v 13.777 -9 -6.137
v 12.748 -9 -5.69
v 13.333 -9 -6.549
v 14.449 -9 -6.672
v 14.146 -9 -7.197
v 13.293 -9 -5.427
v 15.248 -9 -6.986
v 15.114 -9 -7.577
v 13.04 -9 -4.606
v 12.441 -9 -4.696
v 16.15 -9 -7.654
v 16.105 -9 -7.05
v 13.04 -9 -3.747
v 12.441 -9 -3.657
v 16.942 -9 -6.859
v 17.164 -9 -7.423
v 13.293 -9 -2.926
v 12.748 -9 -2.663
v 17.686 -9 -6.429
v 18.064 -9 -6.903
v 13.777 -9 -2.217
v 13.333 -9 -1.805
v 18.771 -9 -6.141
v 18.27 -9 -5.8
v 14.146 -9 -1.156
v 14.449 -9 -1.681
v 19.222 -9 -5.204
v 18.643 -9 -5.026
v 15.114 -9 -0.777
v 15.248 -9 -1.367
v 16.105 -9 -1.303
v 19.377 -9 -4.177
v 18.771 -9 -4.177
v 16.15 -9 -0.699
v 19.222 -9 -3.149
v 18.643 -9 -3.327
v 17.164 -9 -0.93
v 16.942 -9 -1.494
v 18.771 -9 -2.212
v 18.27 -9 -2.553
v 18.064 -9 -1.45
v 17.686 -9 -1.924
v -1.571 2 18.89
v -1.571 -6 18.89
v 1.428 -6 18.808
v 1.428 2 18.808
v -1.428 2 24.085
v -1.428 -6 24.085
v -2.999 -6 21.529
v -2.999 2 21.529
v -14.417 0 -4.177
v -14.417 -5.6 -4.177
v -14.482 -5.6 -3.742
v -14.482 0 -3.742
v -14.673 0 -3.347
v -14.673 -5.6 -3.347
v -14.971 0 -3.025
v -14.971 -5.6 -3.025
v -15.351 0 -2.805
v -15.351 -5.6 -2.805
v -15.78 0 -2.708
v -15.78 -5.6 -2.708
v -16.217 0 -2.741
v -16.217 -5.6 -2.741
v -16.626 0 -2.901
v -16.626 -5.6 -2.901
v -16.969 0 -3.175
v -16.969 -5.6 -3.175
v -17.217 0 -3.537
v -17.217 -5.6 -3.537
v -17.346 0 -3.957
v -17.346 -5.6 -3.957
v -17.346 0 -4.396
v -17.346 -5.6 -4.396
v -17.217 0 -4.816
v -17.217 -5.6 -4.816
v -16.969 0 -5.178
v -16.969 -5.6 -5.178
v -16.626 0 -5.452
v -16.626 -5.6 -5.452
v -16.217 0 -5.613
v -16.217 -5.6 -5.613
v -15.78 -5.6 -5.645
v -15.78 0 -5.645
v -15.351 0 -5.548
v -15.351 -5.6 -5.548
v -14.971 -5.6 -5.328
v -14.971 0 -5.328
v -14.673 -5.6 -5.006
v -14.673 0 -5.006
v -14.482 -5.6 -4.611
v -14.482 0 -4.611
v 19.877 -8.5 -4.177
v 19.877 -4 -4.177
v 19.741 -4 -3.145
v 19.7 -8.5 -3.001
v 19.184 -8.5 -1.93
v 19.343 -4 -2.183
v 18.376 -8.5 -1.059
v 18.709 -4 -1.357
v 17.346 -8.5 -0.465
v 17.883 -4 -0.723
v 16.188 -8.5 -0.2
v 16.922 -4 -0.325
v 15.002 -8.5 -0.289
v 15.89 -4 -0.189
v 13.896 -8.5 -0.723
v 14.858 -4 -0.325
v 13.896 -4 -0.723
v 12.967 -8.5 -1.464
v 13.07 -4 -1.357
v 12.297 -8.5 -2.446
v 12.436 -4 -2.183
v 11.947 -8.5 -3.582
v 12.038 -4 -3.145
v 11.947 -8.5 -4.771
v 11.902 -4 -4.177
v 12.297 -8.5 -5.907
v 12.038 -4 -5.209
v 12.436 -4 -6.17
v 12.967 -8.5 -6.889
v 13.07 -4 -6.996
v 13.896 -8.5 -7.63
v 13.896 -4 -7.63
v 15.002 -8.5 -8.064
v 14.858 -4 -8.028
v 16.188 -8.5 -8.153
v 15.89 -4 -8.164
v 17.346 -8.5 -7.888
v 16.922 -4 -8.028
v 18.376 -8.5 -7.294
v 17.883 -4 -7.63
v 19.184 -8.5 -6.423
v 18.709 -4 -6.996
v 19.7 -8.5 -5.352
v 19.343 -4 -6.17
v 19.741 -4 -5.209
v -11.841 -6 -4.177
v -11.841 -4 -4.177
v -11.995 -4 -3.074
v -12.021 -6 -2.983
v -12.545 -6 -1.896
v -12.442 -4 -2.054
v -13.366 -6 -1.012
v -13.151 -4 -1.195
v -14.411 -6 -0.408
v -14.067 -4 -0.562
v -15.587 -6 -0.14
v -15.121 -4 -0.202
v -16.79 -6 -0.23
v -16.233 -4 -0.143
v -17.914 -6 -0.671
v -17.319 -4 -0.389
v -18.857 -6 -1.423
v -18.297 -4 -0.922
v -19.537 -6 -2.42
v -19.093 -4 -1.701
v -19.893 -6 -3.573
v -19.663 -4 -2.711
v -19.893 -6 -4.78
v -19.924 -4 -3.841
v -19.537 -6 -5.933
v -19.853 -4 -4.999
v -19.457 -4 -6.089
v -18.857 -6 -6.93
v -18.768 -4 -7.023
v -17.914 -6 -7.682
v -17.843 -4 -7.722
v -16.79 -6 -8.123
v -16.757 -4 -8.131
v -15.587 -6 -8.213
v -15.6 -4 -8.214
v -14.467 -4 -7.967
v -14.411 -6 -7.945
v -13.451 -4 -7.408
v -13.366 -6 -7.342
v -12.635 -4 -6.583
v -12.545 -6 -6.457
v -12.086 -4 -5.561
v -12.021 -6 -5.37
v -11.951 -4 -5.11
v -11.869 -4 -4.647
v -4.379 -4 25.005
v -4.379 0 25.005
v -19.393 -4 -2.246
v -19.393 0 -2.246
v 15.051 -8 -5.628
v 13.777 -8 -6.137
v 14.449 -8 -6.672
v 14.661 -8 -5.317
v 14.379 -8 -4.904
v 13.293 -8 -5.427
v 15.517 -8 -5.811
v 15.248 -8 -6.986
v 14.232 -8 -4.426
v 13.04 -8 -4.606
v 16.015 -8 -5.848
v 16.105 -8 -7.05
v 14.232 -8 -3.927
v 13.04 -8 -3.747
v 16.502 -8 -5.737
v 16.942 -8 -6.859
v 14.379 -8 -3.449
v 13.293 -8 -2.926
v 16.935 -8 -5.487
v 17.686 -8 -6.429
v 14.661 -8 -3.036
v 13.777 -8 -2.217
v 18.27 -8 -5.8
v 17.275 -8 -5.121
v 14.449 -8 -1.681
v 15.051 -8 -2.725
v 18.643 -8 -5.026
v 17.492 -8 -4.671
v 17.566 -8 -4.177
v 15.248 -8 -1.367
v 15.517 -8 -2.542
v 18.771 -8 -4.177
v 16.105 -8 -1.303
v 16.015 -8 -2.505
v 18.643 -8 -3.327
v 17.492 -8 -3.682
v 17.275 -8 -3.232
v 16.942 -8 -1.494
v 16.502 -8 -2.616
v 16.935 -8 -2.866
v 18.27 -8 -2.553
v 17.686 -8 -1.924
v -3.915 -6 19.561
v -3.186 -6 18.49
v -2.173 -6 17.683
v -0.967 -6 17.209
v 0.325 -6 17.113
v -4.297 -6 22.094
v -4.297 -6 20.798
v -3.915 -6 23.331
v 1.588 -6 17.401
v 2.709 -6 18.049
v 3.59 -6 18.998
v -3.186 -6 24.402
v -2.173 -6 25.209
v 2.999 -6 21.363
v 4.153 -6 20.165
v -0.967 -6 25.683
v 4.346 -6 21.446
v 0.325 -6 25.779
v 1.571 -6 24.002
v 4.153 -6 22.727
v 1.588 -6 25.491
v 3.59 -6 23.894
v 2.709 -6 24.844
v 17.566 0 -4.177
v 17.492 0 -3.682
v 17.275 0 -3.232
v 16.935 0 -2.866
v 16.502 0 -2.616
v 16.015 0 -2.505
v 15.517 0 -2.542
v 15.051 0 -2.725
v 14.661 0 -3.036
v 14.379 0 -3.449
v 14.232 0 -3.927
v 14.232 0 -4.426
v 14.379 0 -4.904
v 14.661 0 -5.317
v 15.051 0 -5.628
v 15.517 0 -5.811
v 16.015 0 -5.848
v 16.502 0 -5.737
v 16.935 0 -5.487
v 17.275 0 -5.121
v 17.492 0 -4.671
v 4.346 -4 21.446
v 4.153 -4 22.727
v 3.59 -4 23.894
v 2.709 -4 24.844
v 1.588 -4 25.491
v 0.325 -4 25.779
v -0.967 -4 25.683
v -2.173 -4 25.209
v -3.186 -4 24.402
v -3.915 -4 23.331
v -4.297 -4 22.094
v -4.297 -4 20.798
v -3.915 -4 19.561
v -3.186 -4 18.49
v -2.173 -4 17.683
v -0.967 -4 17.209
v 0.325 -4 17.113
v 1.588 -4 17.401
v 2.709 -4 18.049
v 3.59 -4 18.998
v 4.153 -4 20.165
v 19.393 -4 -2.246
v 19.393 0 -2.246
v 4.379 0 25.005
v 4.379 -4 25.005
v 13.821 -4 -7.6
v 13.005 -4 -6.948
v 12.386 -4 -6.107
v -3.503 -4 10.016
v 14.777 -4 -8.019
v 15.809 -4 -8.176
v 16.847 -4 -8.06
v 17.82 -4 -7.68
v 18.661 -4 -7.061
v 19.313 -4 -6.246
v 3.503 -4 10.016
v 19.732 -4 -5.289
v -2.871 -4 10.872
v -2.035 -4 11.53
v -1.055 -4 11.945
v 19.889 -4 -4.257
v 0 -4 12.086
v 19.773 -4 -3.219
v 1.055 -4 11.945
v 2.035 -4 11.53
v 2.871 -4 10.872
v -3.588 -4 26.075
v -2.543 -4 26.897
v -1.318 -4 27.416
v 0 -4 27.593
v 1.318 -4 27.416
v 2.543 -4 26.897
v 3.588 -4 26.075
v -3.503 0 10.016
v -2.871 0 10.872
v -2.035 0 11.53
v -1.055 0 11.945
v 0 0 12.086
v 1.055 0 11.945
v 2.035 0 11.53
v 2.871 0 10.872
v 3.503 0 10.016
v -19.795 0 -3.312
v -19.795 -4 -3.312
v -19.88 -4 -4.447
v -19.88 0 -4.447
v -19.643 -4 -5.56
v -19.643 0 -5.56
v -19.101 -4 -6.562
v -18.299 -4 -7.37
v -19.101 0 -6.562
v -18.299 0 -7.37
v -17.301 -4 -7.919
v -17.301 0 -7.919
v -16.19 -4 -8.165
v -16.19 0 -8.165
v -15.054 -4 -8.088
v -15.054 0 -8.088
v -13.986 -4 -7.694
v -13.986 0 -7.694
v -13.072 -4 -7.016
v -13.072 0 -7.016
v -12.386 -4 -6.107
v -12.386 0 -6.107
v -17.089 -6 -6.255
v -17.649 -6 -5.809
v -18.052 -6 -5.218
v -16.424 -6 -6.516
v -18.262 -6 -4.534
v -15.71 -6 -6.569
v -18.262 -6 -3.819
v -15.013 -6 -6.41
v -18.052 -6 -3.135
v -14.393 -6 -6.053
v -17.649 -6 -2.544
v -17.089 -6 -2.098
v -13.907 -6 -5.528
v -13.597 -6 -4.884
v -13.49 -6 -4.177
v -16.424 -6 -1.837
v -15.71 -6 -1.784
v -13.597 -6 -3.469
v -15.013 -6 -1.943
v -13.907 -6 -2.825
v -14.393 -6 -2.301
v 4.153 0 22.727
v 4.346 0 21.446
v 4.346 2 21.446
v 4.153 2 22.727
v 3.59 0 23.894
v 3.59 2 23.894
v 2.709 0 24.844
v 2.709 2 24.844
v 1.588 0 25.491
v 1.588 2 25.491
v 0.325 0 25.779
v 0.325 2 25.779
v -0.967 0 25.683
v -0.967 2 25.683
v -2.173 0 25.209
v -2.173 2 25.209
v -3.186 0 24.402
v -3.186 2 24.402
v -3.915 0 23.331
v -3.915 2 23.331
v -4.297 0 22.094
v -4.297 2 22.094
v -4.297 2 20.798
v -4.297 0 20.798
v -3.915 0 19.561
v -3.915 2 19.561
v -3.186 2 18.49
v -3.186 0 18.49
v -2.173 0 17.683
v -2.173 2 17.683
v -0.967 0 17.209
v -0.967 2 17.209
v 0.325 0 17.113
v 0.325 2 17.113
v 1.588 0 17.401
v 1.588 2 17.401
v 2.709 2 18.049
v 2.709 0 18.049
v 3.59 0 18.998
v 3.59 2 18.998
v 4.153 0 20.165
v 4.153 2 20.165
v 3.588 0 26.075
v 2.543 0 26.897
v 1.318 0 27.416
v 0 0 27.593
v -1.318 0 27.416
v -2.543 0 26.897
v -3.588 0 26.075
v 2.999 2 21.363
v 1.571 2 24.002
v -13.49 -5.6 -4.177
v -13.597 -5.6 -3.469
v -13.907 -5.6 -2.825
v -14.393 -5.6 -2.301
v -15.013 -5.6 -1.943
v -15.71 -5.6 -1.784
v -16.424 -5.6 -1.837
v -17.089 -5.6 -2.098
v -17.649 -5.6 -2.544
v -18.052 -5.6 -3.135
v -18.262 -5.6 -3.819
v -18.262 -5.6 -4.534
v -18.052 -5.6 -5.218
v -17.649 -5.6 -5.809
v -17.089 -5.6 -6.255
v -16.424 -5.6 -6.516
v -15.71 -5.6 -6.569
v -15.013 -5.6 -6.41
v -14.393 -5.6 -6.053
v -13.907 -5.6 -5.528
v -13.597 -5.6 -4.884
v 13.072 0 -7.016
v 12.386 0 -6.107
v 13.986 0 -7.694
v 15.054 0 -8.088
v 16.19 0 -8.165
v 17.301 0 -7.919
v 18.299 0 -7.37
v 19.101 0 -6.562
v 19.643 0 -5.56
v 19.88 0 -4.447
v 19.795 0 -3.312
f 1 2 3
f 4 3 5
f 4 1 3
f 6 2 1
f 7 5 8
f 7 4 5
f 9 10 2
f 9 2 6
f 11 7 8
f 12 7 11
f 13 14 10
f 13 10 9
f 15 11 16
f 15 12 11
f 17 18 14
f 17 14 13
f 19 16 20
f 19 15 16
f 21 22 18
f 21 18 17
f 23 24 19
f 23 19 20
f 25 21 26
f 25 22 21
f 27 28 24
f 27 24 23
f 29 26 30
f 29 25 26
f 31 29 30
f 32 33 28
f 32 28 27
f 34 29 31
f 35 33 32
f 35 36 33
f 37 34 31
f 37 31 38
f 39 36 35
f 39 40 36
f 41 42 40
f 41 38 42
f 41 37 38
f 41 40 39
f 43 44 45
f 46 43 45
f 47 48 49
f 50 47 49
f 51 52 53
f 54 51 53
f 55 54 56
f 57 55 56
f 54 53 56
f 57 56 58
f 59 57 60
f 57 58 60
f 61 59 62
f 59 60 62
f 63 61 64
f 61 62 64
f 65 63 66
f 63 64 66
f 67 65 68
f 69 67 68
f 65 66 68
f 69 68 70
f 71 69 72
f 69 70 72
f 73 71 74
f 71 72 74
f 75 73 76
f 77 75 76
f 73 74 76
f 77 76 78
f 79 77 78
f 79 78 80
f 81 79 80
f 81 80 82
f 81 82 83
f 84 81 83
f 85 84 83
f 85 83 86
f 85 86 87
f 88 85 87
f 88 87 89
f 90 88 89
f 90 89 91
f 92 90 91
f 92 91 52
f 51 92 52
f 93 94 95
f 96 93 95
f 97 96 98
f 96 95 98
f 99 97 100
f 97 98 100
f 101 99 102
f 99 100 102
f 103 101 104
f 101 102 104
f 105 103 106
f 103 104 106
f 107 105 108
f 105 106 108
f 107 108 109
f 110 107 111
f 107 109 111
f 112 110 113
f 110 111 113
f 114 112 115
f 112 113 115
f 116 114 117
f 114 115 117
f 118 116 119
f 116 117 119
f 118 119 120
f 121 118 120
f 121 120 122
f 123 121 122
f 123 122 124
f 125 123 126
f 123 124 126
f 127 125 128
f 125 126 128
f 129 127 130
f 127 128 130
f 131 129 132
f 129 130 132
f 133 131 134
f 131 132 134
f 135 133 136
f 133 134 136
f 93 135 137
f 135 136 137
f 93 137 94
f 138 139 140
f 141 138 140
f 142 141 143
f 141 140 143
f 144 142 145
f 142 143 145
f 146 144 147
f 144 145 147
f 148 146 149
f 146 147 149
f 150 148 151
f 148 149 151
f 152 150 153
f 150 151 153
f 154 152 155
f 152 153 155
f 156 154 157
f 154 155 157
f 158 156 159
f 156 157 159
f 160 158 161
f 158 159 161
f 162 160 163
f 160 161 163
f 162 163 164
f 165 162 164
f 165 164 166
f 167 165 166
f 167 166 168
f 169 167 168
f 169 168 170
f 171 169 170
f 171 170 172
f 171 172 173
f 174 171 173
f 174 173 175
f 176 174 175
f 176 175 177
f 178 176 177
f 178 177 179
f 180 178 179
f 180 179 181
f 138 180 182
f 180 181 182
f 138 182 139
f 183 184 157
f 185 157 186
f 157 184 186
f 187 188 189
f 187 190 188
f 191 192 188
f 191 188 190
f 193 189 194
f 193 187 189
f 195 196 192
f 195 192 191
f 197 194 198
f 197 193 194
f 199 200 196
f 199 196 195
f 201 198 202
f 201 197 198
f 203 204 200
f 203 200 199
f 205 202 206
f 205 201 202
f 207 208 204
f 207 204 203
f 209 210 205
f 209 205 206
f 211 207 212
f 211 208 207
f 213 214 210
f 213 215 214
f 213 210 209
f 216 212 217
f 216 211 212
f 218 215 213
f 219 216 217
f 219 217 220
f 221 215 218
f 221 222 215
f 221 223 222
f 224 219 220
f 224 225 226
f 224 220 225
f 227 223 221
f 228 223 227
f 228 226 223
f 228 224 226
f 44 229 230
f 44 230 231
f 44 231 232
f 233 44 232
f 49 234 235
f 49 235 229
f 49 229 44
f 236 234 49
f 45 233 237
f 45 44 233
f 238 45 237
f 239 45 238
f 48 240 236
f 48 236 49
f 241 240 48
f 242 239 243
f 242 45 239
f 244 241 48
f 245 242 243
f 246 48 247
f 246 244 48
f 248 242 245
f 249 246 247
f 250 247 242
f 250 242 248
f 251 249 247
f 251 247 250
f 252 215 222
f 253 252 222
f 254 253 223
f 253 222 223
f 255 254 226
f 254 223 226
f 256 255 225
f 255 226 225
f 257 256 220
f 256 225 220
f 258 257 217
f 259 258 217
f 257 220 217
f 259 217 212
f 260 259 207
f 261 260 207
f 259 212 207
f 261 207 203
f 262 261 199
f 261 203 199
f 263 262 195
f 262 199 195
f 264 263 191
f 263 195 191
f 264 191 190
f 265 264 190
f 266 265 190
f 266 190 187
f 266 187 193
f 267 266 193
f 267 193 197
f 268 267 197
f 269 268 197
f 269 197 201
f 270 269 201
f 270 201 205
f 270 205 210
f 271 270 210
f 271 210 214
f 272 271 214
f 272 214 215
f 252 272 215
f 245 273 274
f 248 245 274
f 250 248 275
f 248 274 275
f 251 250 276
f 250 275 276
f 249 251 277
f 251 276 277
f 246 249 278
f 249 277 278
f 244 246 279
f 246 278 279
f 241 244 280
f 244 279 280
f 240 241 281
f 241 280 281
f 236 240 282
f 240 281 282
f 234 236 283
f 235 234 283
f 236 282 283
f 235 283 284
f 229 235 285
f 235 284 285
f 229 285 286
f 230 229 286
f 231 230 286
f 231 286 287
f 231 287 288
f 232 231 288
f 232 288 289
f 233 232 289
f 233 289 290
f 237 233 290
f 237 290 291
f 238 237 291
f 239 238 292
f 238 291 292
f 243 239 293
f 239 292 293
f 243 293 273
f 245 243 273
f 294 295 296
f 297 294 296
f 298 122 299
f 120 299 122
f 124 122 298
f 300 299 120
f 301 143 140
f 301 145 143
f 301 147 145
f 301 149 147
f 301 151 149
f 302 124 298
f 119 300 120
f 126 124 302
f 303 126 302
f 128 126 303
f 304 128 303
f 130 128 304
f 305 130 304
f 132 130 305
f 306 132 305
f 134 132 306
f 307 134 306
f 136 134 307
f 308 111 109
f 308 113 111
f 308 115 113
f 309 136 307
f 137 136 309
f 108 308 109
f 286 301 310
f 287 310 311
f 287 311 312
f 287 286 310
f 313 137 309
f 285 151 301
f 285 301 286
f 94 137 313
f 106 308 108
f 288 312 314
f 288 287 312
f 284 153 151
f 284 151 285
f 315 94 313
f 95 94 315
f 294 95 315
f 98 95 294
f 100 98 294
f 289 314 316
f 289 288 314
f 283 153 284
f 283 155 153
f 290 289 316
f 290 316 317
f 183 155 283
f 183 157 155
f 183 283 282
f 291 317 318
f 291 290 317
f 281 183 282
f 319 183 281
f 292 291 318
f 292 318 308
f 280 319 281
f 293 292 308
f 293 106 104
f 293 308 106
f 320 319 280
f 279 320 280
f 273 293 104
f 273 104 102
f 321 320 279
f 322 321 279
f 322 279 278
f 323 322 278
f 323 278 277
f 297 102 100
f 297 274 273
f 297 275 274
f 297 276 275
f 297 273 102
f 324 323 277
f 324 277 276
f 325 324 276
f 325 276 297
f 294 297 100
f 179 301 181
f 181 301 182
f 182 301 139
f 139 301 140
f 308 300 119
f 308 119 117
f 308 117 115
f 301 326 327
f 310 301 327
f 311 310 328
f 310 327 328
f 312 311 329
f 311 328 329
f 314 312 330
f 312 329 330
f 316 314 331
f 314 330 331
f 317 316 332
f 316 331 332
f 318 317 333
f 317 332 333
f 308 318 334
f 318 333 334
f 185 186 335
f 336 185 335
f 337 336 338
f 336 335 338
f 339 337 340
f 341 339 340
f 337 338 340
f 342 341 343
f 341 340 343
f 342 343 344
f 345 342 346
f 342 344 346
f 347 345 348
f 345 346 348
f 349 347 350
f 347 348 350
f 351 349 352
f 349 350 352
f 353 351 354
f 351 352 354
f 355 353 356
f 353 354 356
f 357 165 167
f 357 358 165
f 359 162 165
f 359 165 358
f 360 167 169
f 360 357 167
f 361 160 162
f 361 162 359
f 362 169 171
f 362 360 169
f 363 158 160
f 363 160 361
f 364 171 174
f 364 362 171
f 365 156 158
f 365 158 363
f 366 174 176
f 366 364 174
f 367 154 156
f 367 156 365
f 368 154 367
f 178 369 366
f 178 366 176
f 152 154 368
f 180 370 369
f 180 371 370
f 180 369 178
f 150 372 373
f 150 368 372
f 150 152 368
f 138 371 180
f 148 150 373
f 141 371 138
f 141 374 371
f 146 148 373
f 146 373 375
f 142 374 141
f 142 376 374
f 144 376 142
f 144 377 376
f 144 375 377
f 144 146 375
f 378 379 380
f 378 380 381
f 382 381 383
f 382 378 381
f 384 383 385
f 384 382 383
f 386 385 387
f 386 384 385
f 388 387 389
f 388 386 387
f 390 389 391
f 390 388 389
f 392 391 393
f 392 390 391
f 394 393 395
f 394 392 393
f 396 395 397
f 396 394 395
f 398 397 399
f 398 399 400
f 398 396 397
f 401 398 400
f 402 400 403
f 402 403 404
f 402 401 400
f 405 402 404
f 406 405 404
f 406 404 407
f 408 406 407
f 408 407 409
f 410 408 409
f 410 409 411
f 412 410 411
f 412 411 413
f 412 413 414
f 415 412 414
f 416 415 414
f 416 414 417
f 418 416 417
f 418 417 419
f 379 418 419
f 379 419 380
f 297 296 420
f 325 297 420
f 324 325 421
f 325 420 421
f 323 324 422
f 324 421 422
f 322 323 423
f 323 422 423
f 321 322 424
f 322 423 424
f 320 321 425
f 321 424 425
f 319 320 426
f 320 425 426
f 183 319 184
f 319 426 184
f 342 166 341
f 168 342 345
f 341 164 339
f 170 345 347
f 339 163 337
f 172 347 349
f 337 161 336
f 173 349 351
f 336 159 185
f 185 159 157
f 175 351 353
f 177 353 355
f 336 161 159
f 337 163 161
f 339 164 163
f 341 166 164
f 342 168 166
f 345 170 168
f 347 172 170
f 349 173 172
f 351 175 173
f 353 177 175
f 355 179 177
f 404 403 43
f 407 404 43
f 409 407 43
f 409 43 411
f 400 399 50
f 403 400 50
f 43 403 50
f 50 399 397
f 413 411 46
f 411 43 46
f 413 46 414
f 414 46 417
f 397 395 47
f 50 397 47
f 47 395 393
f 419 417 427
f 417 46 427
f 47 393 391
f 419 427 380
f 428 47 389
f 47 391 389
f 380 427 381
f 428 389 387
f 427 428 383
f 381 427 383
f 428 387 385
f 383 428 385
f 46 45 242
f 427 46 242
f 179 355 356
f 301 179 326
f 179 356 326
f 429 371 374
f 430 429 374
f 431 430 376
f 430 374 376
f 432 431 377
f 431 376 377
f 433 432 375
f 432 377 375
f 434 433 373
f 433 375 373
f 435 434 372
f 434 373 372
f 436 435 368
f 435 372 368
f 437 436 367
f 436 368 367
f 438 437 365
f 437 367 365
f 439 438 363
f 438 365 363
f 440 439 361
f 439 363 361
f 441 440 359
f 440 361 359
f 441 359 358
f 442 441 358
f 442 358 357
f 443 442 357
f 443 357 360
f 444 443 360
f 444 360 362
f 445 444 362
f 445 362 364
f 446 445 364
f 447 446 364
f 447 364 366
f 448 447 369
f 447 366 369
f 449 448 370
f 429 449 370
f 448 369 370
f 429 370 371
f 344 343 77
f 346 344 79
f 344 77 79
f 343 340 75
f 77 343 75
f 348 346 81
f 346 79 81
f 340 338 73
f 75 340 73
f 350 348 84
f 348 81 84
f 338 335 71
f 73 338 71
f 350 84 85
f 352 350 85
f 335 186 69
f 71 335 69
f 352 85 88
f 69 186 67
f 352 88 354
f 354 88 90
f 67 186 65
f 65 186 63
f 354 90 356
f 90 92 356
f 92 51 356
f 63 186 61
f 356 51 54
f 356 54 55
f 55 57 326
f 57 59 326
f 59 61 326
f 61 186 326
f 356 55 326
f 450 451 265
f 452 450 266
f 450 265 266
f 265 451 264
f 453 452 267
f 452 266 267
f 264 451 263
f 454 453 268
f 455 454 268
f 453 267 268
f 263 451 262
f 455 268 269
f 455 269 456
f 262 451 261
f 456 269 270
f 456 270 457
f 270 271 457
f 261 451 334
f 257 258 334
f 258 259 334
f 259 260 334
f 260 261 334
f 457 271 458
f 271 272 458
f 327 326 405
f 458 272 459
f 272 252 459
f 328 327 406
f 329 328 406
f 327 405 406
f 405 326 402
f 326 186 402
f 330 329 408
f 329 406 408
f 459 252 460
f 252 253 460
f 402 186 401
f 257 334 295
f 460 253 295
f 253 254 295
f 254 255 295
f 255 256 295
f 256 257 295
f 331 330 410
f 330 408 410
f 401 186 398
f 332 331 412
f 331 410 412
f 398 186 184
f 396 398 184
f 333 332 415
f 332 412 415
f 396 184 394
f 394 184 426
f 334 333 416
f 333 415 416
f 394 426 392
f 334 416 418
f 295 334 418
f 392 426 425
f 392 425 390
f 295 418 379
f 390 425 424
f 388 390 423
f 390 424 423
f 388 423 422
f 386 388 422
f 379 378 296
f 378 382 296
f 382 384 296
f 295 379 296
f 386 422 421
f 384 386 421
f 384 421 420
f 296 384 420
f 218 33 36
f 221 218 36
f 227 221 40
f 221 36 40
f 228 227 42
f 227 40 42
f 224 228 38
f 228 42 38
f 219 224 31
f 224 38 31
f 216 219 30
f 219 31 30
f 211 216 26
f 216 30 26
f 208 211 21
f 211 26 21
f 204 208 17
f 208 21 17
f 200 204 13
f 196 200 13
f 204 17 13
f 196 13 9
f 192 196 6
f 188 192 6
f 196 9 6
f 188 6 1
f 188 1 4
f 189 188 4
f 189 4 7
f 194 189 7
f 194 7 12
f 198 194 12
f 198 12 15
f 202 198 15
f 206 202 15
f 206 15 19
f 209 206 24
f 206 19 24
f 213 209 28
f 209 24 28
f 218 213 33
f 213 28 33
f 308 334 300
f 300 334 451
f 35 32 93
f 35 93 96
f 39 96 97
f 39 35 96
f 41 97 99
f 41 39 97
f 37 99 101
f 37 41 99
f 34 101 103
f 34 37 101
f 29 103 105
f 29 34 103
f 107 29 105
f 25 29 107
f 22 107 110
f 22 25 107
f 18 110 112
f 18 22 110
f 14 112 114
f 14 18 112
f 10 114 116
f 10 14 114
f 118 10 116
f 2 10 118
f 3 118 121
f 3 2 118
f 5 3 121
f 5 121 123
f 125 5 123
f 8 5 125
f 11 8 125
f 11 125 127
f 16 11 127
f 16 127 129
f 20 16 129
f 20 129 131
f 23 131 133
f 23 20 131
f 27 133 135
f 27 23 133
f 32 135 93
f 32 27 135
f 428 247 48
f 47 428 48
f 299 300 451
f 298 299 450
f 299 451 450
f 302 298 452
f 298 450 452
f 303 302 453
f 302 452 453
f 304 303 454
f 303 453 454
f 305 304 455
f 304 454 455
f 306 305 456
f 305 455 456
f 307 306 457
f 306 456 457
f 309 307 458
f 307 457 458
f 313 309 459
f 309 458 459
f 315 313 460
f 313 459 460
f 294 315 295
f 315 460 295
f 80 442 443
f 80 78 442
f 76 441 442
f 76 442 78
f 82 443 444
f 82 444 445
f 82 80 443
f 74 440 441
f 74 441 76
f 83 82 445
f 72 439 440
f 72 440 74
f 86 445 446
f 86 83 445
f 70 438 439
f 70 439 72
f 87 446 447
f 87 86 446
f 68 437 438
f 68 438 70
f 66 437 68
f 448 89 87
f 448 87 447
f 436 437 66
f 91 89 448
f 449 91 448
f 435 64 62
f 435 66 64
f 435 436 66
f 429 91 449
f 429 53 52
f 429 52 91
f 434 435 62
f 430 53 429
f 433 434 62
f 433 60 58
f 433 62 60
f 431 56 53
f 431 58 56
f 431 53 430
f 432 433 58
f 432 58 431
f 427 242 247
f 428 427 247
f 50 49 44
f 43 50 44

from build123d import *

# Parameters (mm, degrees)
F1_DEPTH      = 4
F2_R          = 4.345587
F3_DEPTH      = 2
F3_DEPTH_BACK = 6
F5_DEPTH      = 25
F6_R          = 4.04816
F7_DEPTH      = 2
F8_R          = 2.39956
F9_DEPTH      = 0.4
F10_R         = 1.472917
F11_DEPTH     = 25
F12_R         = 3.987391
F13_DEPTH     = 5
F14_R         = 2.881593
F15_DEPTH     = 1
F16_R         = 1.676449
F17_DEPTH     = 25
F18_SIZE      = 0.5


with BuildPart() as f1:
    # F0 (on Front) → F1 (new body)
    with BuildSketch(Plane.XZ):
        with BuildLine():
            Line((19.393065, -2.246393), (4.379365, 25.005329))
            ThreePointArc((4.379365, 25.005329), (0, 27.59262), (-4.379365, 25.005329))
            Line((-4.379365, 25.005329), (-19.393065, -2.246393))
            ThreePointArc((-19.393065, -2.246393), (-17.81974, -7.680052), (-12.386081, -6.106727))
            Line((-12.386081, -6.106727), (-3.503492, 10.01627))
            ThreePointArc((-3.503492, 10.01627), (0, 12.086103), (3.503492, 10.01627))
            Line((3.503492, 10.01627), (12.386081, -6.106727))
            ThreePointArc((12.386081, -6.106727), (17.81974, -7.680052), (19.393065, -2.246393))
        make_face()
    extrude(amount=F1_DEPTH)

    # F2 (on face) → F3 (join, two sides)
    with BuildSketch(Plane.XZ.offset(4)) as f3_sk:
        with Locations((0, 21.446018)):
            Circle(F2_R)
    extrude(amount=F3_DEPTH)
    extrude(f3_sk.sketch, amount=-F3_DEPTH_BACK)

    # F4 (on face) → F5 (cut)
    with BuildSketch(Plane.XZ.offset(6)):
        Polygon((-1.571178, 18.890357), (1.427678, 18.807508), (2.998856, 21.363168), (1.571178, 24.001678), (-1.427678, 24.084528), (-2.998856, 21.528867), align=None)
    extrude(amount=-F5_DEPTH, mode=Mode.SUBTRACT)

    # F6 (on face) → F7 (join)
    with BuildSketch(Plane.XZ.offset(4)):
        with Locations((-15.889573, -4.17656)):
            Circle(F6_R)
    extrude(amount=F7_DEPTH)

    # F8 (on face) → F9 (cut)
    with BuildSketch(Plane.XZ.offset(6)):
        with Locations((-15.889573, -4.17656)):
            Circle(F8_R)
    extrude(amount=-F9_DEPTH, mode=Mode.SUBTRACT)

    # F10 (on face) → F11 (cut)
    with BuildSketch(Plane.XZ.offset(5.6)):
        with Locations((-15.889573, -4.17656)):
            Circle(F10_R)
    extrude(amount=-F11_DEPTH, mode=Mode.SUBTRACT)

    # F12 (on face) → F13 (join)
    with BuildSketch(Plane.XZ.offset(4)):
        with Locations((15.889573, -4.17656)):
            Circle(F12_R)
    extrude(amount=F13_DEPTH)

    # F14 (on face) → F15 (cut)
    with BuildSketch(Plane.XZ.offset(9)):
        with Locations((15.889573, -4.17656)):
            Circle(F14_R)
    extrude(amount=-F15_DEPTH, mode=Mode.SUBTRACT)

    # F16 (on face) → F17 (cut)
    with BuildSketch(Plane.XZ.offset(8)):
        with Locations((15.889573, -4.17656)):
            Circle(F16_R)
    extrude(amount=-F17_DEPTH, mode=Mode.SUBTRACT)

    # F18
    f18_edges = [f1.edges().sort_by_distance(p)[0] for p in [
        (11.902182, -9, -4.17656),
    ]]
    chamfer(f18_edges, length=F18_SIZE)


solid = f1.part
